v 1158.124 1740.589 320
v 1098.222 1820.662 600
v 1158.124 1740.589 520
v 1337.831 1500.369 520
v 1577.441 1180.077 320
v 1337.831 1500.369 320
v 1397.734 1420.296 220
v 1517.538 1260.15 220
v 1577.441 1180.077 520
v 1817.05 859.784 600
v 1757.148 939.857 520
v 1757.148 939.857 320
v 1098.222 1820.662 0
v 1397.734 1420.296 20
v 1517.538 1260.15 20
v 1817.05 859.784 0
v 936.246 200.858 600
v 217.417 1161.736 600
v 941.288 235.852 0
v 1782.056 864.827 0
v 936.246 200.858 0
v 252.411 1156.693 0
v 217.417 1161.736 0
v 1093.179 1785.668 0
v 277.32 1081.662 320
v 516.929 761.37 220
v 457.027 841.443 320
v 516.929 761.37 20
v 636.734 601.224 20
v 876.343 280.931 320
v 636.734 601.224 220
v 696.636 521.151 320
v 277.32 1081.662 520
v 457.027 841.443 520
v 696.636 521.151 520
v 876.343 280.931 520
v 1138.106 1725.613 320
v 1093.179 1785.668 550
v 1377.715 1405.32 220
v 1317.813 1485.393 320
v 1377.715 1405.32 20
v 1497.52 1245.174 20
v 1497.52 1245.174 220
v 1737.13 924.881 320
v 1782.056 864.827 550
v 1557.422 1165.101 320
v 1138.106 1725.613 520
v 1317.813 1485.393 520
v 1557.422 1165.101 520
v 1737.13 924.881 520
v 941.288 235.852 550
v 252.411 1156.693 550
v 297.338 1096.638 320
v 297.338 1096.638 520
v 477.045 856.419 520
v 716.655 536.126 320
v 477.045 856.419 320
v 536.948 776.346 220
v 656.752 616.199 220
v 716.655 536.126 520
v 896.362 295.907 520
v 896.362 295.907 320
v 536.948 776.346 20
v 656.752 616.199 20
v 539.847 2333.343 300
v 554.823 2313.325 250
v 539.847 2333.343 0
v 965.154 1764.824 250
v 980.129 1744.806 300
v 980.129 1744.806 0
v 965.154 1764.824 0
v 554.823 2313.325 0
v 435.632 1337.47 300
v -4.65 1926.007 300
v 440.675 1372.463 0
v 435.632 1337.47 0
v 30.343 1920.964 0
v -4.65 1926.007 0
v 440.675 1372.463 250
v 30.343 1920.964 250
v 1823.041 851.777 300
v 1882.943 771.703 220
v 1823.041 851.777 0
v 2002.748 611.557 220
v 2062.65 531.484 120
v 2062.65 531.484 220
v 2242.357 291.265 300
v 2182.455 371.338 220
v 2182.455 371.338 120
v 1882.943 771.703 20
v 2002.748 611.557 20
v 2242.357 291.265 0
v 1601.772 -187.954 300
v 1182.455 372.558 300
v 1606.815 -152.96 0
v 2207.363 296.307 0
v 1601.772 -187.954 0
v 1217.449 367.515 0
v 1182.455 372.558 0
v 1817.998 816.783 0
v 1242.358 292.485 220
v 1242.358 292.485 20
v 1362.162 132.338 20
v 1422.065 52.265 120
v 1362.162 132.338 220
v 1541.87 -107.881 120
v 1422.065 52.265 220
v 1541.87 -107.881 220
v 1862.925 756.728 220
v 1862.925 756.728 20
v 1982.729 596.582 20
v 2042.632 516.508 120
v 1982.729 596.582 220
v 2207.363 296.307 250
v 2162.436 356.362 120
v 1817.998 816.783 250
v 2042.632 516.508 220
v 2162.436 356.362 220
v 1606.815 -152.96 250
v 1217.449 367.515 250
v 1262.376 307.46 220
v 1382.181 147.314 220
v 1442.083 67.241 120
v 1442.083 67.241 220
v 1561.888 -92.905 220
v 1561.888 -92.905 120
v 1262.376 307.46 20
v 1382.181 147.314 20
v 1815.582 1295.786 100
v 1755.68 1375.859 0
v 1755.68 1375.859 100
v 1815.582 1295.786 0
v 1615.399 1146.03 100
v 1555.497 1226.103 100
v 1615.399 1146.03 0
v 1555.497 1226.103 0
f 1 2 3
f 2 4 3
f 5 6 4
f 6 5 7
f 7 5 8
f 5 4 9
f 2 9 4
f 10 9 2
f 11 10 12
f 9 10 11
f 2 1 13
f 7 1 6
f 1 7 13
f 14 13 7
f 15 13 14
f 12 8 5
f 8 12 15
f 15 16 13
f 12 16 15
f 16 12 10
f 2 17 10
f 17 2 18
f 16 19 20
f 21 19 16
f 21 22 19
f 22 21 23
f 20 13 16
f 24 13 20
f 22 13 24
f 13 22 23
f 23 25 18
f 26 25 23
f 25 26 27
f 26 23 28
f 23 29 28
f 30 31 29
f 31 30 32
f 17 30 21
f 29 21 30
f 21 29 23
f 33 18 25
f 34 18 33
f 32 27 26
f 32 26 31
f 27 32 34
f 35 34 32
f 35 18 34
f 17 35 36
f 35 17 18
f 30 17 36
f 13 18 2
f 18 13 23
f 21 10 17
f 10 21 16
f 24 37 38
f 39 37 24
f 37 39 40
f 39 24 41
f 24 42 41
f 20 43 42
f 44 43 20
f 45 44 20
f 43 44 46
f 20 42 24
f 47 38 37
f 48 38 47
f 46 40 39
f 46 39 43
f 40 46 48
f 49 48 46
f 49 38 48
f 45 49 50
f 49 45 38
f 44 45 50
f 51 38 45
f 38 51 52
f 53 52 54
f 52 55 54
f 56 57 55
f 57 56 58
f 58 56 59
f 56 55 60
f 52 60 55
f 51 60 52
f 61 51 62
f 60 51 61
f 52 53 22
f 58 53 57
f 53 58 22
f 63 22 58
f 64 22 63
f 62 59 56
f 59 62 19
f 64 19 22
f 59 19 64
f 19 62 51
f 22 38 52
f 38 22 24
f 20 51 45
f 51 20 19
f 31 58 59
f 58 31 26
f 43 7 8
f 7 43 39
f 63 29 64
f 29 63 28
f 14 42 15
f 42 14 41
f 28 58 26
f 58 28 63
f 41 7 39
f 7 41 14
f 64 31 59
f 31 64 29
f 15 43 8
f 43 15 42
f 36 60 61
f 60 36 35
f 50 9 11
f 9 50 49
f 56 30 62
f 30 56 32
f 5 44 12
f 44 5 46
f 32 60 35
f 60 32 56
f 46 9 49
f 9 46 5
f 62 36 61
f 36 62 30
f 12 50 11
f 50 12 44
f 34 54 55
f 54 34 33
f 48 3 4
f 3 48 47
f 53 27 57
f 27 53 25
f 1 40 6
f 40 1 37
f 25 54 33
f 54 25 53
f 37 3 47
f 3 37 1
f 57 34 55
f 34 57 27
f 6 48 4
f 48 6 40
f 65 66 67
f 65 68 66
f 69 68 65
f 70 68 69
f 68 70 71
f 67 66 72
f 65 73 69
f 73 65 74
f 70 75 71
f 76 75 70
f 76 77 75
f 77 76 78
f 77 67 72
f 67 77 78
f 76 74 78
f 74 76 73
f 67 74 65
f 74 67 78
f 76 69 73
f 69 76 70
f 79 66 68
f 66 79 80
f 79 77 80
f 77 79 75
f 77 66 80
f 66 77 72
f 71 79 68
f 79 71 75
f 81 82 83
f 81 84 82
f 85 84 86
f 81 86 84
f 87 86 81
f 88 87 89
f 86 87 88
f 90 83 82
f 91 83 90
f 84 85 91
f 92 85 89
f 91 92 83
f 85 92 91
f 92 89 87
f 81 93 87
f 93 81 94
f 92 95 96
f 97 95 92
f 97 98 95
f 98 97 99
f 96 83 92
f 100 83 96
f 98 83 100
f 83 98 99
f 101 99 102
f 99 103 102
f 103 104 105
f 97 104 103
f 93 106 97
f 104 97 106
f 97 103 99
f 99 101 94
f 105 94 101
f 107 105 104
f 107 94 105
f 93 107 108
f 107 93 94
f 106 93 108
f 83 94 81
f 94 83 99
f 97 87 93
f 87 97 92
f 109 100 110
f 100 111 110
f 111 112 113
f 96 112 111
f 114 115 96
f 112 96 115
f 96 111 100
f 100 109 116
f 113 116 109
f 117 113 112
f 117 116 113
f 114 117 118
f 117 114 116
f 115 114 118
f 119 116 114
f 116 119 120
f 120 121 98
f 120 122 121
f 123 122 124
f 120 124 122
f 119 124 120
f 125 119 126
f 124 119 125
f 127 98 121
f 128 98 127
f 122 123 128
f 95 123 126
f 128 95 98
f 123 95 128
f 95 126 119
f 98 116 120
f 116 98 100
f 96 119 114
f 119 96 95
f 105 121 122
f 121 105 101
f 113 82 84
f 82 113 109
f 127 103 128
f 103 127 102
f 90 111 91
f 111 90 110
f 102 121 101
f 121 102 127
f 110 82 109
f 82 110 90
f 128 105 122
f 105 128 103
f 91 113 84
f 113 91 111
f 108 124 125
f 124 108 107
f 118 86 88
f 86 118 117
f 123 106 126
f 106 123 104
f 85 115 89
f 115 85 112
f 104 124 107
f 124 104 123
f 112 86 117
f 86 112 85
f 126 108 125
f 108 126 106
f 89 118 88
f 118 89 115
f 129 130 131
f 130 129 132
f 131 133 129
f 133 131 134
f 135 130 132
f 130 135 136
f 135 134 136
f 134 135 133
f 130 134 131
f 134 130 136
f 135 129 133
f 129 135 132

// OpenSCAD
a = 500 * [[0,0],[0,5.2],[1.5,5.4],[6.5,-1.2]];

%polygon(a);

module mainbuilding() {
    difference() {
    color("gray") cube([1100,1200,600], center=false);
        translate([25,25,0]) cube([1050,1150,550], center=false);
        
        translate([-100,500,20]) cube([1400,200,200], center=false);

        
        translate([-100,100,320]) cube([1400,300,200], center=false);

        translate([-100,800,320]) cube([1400,300,200], center=false);

    }
}

module rentalunit() {
    difference() {
       color("darkgray") cube([800,700,300], center=false); 
      
        translate([25,25,0]) cube([750,650,250], center=false);
        
        translate([-100,400,20]) cube([1400,200,200], center=false);

        translate([-100,100,120]) cube([1400,200,100], center=false);
    }
}

module garage() {
    // 680 x 735 garasje.
    difference() {
     color("lightgray") cube([680,735,300], center=false);   

            translate([25,25,0]) cube([730,685,250], center=false);
    }

}

rotate([0,0,36.8]) union() { 
    translate([870,-400,0]) mainbuilding();
    
    translate([1150,810,0]) garage();

    translate([1170,-1110,0]) rentalunit();
    
    translate([1980,-50,0]) cube([250,100,100]);
}
    
